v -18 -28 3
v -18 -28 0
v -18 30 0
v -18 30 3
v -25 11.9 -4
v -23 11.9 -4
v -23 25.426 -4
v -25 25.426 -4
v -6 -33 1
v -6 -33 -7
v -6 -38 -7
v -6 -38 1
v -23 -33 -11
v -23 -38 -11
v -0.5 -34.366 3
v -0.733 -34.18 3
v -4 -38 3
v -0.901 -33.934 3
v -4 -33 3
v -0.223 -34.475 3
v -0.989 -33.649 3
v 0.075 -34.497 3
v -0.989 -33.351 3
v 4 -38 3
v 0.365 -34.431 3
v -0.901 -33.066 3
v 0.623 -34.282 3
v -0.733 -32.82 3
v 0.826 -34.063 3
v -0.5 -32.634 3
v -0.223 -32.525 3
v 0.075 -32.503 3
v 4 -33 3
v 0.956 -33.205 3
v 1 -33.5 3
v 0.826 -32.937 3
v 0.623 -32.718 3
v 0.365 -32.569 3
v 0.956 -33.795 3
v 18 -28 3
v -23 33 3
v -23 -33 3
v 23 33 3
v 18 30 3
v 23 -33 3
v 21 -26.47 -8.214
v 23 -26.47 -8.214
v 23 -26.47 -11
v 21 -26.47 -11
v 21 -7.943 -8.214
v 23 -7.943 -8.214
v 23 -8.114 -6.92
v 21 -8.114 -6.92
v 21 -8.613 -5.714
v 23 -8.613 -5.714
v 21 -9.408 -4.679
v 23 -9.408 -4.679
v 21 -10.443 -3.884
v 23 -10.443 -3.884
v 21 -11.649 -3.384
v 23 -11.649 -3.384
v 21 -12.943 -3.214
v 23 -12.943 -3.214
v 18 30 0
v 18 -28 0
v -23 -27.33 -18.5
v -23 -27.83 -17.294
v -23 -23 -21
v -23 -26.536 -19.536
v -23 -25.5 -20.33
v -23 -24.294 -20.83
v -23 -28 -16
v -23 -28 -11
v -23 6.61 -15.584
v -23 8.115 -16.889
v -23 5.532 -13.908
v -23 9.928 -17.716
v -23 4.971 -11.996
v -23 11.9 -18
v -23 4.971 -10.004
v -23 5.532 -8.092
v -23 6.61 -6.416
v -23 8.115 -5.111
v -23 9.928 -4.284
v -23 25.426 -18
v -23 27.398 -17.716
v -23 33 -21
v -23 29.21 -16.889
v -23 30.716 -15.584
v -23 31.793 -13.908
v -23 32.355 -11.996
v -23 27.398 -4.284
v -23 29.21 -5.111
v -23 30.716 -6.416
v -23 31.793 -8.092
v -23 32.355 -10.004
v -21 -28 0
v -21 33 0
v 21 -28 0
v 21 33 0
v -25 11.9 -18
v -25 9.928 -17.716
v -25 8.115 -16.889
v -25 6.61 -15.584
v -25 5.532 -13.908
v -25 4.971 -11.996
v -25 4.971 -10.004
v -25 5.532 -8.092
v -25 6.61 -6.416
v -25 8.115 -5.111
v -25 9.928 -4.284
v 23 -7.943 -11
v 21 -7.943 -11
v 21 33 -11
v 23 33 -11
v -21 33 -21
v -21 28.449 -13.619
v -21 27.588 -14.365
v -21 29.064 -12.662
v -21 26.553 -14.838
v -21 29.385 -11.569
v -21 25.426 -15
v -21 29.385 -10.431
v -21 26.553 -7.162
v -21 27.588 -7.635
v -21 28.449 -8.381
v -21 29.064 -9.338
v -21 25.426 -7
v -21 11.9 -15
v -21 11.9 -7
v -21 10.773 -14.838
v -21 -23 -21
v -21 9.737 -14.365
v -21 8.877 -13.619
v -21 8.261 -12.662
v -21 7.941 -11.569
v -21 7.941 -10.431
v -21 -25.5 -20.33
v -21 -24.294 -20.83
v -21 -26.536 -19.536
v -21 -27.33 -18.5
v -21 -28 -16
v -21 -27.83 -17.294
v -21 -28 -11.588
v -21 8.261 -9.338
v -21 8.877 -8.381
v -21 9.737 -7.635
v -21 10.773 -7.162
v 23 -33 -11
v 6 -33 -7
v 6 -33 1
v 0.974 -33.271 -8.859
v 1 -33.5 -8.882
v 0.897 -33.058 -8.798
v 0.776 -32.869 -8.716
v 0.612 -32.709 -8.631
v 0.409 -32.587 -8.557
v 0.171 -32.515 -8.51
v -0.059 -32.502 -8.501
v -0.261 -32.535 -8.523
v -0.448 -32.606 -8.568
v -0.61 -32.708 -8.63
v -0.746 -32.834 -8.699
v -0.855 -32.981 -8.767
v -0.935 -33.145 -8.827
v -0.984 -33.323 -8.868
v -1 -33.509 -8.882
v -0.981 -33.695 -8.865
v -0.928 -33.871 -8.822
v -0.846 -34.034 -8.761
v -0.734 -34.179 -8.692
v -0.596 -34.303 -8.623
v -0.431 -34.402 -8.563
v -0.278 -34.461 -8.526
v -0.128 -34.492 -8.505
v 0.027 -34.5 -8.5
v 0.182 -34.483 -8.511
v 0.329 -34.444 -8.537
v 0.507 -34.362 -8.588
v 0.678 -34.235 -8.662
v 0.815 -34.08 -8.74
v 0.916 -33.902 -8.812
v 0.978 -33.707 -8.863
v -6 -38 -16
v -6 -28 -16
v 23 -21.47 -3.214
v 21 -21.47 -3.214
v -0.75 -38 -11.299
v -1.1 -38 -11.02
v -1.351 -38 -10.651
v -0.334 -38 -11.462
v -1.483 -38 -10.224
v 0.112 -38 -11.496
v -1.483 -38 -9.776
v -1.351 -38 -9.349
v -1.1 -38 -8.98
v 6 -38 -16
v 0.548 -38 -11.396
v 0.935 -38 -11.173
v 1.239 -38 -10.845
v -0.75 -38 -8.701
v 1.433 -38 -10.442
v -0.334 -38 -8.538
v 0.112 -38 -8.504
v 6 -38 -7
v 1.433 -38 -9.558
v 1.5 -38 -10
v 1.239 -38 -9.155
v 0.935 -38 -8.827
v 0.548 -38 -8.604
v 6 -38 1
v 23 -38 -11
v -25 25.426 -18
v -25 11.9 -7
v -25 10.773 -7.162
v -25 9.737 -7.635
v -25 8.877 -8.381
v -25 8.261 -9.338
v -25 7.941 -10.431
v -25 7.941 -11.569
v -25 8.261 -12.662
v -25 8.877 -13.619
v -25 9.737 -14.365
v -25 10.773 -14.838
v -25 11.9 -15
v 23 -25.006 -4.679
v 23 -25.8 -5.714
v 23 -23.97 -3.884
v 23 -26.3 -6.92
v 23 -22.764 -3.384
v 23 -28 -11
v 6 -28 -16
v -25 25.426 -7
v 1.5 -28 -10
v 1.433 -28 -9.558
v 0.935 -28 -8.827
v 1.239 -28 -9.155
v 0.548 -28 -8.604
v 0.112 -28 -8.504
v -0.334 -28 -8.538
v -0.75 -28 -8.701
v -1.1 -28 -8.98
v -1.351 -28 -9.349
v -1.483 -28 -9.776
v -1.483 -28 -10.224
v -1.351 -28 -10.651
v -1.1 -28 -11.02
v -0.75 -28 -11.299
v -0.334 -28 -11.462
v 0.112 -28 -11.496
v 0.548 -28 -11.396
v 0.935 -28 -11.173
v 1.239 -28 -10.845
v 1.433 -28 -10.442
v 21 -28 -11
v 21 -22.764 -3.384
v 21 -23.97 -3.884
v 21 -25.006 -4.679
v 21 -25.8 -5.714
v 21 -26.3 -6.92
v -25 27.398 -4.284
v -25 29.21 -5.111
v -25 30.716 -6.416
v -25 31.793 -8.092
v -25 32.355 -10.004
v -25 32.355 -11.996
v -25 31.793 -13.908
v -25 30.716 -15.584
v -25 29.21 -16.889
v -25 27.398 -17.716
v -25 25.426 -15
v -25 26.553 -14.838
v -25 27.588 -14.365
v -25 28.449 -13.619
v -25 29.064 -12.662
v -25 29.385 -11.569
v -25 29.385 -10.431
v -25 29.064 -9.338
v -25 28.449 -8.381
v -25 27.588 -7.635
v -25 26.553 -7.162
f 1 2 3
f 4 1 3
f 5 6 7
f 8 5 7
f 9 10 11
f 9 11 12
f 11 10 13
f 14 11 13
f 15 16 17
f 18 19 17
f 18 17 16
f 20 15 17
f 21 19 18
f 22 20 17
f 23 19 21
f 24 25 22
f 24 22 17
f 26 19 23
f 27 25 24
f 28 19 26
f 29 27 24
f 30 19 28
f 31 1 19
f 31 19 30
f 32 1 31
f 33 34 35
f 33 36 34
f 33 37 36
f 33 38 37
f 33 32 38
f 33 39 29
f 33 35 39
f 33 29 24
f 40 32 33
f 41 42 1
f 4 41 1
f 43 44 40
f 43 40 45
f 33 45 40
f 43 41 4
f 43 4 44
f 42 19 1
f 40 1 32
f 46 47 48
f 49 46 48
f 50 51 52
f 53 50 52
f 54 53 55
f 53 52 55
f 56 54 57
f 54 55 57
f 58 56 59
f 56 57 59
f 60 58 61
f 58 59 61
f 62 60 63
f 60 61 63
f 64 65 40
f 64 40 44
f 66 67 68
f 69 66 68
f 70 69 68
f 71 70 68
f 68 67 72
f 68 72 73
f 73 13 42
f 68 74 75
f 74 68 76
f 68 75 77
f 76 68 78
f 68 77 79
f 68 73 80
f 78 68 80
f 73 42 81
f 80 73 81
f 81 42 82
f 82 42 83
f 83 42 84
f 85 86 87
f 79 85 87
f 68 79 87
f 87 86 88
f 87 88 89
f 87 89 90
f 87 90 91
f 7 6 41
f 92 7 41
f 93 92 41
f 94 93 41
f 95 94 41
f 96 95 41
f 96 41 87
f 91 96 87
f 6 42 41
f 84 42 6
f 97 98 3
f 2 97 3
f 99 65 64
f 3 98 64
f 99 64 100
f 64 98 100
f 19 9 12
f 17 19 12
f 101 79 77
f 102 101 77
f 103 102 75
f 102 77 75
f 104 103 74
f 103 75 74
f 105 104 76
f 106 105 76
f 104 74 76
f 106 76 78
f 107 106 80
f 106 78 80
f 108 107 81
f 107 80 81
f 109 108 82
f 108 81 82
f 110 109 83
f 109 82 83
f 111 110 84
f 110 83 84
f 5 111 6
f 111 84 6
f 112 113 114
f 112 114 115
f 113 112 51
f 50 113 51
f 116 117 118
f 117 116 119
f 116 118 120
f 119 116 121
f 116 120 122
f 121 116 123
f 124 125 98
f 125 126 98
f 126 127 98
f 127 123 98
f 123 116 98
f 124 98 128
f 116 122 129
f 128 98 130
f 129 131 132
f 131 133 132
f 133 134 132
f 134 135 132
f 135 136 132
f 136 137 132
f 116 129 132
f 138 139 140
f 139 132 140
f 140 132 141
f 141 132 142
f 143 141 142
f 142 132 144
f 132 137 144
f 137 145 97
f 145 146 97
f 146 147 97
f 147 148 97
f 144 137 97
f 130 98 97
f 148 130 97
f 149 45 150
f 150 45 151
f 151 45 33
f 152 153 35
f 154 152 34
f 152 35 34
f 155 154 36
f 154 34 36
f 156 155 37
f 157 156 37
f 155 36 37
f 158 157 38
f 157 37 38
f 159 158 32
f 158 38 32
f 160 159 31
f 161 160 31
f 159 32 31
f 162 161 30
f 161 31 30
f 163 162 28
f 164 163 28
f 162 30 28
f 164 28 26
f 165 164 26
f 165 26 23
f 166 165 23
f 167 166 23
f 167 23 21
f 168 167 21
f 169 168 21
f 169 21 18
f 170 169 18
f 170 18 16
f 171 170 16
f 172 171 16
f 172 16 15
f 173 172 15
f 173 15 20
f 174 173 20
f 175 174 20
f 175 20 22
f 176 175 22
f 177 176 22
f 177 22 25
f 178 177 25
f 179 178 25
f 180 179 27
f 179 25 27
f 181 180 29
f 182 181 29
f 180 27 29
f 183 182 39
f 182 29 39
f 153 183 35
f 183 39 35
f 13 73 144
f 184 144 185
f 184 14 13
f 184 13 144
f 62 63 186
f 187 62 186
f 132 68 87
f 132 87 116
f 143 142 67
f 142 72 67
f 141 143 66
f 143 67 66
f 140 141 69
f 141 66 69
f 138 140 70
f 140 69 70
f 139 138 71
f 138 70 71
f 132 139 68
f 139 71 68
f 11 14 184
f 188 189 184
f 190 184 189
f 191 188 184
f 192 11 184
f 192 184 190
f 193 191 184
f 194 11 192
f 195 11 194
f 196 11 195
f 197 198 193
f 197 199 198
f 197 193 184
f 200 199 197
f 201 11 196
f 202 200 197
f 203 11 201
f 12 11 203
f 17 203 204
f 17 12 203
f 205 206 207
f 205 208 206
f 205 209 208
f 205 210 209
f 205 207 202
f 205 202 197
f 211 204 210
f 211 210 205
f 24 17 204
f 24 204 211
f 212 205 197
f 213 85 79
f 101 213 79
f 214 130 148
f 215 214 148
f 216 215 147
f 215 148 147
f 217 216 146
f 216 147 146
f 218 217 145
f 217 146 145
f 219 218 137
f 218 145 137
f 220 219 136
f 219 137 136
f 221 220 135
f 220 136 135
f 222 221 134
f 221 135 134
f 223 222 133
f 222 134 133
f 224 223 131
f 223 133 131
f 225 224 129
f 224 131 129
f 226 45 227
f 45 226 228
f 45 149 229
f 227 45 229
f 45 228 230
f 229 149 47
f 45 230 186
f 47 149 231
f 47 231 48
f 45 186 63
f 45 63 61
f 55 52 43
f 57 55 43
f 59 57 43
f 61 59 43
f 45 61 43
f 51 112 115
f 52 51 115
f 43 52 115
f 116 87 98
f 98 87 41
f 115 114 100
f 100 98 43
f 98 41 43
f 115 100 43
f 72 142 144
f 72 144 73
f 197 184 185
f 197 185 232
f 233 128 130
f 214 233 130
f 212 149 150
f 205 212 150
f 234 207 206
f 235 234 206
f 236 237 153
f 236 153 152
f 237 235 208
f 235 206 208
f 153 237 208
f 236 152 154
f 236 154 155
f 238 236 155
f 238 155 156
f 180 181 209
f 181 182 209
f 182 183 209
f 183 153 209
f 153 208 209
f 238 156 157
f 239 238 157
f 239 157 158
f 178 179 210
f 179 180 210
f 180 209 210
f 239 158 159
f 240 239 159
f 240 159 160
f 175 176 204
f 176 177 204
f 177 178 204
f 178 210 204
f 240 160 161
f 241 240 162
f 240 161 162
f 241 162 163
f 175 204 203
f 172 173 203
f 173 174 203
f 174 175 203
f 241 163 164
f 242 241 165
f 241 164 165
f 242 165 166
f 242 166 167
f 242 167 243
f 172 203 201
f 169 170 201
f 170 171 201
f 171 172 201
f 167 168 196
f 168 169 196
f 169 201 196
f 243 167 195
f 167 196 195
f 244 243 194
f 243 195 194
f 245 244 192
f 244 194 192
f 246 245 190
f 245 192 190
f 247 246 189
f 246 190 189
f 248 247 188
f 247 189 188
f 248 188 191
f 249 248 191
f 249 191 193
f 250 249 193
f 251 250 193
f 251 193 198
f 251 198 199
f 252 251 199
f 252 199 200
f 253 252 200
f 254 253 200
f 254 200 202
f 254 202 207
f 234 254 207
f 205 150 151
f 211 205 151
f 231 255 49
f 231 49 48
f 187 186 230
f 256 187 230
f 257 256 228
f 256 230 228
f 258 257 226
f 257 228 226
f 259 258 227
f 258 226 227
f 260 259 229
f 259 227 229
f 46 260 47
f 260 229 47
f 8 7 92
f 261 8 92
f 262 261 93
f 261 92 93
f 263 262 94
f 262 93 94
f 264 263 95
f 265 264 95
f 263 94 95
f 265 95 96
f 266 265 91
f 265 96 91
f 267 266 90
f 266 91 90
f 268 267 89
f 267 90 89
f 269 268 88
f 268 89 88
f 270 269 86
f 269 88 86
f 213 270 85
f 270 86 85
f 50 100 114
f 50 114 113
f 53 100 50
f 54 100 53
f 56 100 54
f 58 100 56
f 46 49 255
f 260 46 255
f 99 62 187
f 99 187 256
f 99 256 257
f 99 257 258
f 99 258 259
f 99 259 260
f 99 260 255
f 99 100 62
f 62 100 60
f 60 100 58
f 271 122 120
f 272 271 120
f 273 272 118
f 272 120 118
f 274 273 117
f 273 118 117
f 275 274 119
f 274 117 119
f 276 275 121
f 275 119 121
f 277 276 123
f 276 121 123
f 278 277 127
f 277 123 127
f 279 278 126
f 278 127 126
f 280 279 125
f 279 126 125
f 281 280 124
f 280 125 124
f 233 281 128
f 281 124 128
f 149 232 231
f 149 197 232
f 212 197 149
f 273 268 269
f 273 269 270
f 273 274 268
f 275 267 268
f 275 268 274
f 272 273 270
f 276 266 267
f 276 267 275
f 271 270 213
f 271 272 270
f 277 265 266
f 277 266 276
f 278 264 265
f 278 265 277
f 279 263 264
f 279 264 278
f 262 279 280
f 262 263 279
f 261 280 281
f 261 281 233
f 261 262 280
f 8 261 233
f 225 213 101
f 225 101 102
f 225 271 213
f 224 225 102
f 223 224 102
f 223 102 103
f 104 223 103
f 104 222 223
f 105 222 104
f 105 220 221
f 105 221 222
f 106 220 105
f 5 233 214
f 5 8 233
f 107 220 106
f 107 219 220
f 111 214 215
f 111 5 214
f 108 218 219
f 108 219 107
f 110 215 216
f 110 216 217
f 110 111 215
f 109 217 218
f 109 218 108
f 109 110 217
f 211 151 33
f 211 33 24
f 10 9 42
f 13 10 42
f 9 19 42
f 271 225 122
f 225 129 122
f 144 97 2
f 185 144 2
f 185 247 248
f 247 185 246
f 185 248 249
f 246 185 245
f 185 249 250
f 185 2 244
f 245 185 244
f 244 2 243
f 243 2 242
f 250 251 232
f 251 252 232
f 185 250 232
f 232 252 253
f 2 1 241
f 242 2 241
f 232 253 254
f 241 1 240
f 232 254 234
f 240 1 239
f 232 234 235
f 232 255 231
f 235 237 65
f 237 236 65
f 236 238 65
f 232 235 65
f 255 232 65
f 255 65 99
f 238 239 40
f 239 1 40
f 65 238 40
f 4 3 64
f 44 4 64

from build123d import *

# Parameters (mm, degrees)
F0_W          = 46
F0_H          = 66
F0_W_2        = 36
F0_H_2        = 58
F1_DEPTH      = 3
F2_W          = 2
F2_H          = 61
F2_H_2        = 5
F3_DEPTH      = 11
F5_DEPTH      = 2
F6_W          = 12
F6_H          = 10
F7_DEPTH      = 5
F7_DEPTH_BACK = 5
F8_R          = 1.5
F9_DEPTH      = 10
F10_R         = 1
F11_DEPTH     = 11.8829661115
F12_DEPTH     = 10
F14_DEPTH     = 2
F16_DEPTH     = 2
F17_R         = 5
F18_SIZE      = 2


with BuildPart() as f1:
    # F0 (on Top) → F1 (new body)
    with BuildSketch(Plane.XY):
        Rectangle(F0_W, F0_H)
        with Locations((0, 1)):
            Rectangle(F0_W_2, F0_H_2, mode=Mode.SUBTRACT)
    extrude(amount=F1_DEPTH)

    # F2 (on face) → F3 (join)
    with BuildSketch(Plane(origin=(0, 0, 0), x_dir=(1, 0, 0), z_dir=(0, 0, -1))):
        with Locations((-22, -2.5)):
            Rectangle(F2_W, F2_H)
        Polygon((18, 28), (21, 28), (21, 33), (-23, 33), (-23, 28), (-21, 28), (-18, 28), align=None)
        with Locations((22, -2.5)):
            Rectangle(F2_W, F2_H)
        with Locations((22, 30.5)):
            Rectangle(F2_W, F2_H_2)
    extrude(amount=F3_DEPTH)

    # F4 (on face) → F5 (cut, through all)
    with BuildSketch(Plane.YZ.offset(23)):
        with BuildLine():
            Line((-26.4700967818, -11), (-7.943155244, -11))
            Line((-7.943155244, -11), (-7.943155244, -8.2140678056))
            ThreePointArc((-7.943155244, -8.2140678056), (-9.4076213381, -4.6785338996), (-12.943155244, -3.2140678056))
            Line((-12.943155244, -3.2140678056), (-21.4700967818, -3.2140678056))
            ThreePointArc((-21.4700967818, -3.2140678056), (-25.0056306878, -4.6785338996), (-26.4700967818, -8.2140678056))
            Line((-26.4700967818, -8.2140678056), (-26.4700967818, -11))
        make_face()
    extrude(amount=-F5_DEPTH, mode=Mode.SUBTRACT)

    # F6 (on face) → F7 (join, two sides)
    with BuildSketch(Plane.XZ.offset(33)) as f7_sk:
        with Locations((0, -2)):
            Rectangle(F6_W, F6_H)
        Polygon((23, -11), (6, -7), (-6, -7), (-23, -11), (-6, -16), (6, -16), align=None)
    extrude(amount=F7_DEPTH)
    extrude(f7_sk.sketch, amount=-F7_DEPTH_BACK)

    # F8 (on face) → F9 (cut, through all)
    with BuildSketch(Plane.XZ.offset(38)):
        with Locations((0, -10)):
            Circle(F8_R)
    extrude(amount=-F9_DEPTH, mode=Mode.SUBTRACT)

    # F10 (on face) → F11 (cut, through all)
    with BuildSketch(Plane.XY.offset(3)):
        with Locations((0, -33.5)):
            Circle(F10_R)
    extrude(amount=-F11_DEPTH, mode=Mode.SUBTRACT)

    # F12 (add): a face of the model
    f12_faces = [f1.faces().sort_by_distance(p)[0] for p in [
        (-22, 2.5, -11),
    ]]
    extrude(f12_faces, amount=F12_DEPTH)

    # F13 (on face) → F14 (cut, through all)
    with BuildSketch(Plane(origin=(-23, 0, 0), x_dir=(0, -1, 0), z_dir=(-1, 0, 0))):
        with BuildLine():
            ThreePointArc((-25.4259229114, -7), (-29.4259229114, -11), (-25.4259229114, -15))
            Line((-25.4259229114, -15), (-11.899846606, -15))
            ThreePointArc((-11.899846606, -15), (-7.899846606, -11), (-11.899846606, -7))
            Line((-11.899846606, -7), (-25.4259229114, -7))
        make_face()
    extrude(amount=-F14_DEPTH, mode=Mode.SUBTRACT)

    # F15 (on face) → F16 (join)
    with BuildSketch(Plane(origin=(-23, 0, 0), x_dir=(0, -1, 0), z_dir=(-1, 0, 0))):
        with BuildLine():
            ThreePointArc((-25.4259229114, -4), (-32.4259229114, -11), (-25.4259229114, -18))
            Line((-25.4259229114, -18), (-11.899846606, -18))
            ThreePointArc((-11.899846606, -18), (-4.899846606, -11), (-11.899846606, -4))
            Line((-11.899846606, -4), (-25.4259229114, -4))
        make_face()
        with BuildLine():
            Line((-11.899846606, -15), (-25.4259229114, -15))
            ThreePointArc((-25.4259229114, -15), (-29.4259229114, -11), (-25.4259229114, -7))
            Line((-25.4259229114, -7), (-11.899846606, -7))
            ThreePointArc((-11.899846606, -7), (-7.899846606, -11), (-11.899846606, -15))
        make_face(mode=Mode.SUBTRACT)
    extrude(amount=F16_DEPTH)

    # F17
    f17_edges = [f1.edges().sort_by_distance(p)[0] for p in [
        (-22, -28, -21),
    ]]
    fillet(f17_edges, radius=F17_R)

    # F18
    f18_edges = [f1.edges().sort_by_distance(p)[0] for p in [
        (6, -35.5, 3),
        (-6, -35.5, 3),
    ]]
    chamfer(f18_edges, length=F18_SIZE)


solid = f1.part
